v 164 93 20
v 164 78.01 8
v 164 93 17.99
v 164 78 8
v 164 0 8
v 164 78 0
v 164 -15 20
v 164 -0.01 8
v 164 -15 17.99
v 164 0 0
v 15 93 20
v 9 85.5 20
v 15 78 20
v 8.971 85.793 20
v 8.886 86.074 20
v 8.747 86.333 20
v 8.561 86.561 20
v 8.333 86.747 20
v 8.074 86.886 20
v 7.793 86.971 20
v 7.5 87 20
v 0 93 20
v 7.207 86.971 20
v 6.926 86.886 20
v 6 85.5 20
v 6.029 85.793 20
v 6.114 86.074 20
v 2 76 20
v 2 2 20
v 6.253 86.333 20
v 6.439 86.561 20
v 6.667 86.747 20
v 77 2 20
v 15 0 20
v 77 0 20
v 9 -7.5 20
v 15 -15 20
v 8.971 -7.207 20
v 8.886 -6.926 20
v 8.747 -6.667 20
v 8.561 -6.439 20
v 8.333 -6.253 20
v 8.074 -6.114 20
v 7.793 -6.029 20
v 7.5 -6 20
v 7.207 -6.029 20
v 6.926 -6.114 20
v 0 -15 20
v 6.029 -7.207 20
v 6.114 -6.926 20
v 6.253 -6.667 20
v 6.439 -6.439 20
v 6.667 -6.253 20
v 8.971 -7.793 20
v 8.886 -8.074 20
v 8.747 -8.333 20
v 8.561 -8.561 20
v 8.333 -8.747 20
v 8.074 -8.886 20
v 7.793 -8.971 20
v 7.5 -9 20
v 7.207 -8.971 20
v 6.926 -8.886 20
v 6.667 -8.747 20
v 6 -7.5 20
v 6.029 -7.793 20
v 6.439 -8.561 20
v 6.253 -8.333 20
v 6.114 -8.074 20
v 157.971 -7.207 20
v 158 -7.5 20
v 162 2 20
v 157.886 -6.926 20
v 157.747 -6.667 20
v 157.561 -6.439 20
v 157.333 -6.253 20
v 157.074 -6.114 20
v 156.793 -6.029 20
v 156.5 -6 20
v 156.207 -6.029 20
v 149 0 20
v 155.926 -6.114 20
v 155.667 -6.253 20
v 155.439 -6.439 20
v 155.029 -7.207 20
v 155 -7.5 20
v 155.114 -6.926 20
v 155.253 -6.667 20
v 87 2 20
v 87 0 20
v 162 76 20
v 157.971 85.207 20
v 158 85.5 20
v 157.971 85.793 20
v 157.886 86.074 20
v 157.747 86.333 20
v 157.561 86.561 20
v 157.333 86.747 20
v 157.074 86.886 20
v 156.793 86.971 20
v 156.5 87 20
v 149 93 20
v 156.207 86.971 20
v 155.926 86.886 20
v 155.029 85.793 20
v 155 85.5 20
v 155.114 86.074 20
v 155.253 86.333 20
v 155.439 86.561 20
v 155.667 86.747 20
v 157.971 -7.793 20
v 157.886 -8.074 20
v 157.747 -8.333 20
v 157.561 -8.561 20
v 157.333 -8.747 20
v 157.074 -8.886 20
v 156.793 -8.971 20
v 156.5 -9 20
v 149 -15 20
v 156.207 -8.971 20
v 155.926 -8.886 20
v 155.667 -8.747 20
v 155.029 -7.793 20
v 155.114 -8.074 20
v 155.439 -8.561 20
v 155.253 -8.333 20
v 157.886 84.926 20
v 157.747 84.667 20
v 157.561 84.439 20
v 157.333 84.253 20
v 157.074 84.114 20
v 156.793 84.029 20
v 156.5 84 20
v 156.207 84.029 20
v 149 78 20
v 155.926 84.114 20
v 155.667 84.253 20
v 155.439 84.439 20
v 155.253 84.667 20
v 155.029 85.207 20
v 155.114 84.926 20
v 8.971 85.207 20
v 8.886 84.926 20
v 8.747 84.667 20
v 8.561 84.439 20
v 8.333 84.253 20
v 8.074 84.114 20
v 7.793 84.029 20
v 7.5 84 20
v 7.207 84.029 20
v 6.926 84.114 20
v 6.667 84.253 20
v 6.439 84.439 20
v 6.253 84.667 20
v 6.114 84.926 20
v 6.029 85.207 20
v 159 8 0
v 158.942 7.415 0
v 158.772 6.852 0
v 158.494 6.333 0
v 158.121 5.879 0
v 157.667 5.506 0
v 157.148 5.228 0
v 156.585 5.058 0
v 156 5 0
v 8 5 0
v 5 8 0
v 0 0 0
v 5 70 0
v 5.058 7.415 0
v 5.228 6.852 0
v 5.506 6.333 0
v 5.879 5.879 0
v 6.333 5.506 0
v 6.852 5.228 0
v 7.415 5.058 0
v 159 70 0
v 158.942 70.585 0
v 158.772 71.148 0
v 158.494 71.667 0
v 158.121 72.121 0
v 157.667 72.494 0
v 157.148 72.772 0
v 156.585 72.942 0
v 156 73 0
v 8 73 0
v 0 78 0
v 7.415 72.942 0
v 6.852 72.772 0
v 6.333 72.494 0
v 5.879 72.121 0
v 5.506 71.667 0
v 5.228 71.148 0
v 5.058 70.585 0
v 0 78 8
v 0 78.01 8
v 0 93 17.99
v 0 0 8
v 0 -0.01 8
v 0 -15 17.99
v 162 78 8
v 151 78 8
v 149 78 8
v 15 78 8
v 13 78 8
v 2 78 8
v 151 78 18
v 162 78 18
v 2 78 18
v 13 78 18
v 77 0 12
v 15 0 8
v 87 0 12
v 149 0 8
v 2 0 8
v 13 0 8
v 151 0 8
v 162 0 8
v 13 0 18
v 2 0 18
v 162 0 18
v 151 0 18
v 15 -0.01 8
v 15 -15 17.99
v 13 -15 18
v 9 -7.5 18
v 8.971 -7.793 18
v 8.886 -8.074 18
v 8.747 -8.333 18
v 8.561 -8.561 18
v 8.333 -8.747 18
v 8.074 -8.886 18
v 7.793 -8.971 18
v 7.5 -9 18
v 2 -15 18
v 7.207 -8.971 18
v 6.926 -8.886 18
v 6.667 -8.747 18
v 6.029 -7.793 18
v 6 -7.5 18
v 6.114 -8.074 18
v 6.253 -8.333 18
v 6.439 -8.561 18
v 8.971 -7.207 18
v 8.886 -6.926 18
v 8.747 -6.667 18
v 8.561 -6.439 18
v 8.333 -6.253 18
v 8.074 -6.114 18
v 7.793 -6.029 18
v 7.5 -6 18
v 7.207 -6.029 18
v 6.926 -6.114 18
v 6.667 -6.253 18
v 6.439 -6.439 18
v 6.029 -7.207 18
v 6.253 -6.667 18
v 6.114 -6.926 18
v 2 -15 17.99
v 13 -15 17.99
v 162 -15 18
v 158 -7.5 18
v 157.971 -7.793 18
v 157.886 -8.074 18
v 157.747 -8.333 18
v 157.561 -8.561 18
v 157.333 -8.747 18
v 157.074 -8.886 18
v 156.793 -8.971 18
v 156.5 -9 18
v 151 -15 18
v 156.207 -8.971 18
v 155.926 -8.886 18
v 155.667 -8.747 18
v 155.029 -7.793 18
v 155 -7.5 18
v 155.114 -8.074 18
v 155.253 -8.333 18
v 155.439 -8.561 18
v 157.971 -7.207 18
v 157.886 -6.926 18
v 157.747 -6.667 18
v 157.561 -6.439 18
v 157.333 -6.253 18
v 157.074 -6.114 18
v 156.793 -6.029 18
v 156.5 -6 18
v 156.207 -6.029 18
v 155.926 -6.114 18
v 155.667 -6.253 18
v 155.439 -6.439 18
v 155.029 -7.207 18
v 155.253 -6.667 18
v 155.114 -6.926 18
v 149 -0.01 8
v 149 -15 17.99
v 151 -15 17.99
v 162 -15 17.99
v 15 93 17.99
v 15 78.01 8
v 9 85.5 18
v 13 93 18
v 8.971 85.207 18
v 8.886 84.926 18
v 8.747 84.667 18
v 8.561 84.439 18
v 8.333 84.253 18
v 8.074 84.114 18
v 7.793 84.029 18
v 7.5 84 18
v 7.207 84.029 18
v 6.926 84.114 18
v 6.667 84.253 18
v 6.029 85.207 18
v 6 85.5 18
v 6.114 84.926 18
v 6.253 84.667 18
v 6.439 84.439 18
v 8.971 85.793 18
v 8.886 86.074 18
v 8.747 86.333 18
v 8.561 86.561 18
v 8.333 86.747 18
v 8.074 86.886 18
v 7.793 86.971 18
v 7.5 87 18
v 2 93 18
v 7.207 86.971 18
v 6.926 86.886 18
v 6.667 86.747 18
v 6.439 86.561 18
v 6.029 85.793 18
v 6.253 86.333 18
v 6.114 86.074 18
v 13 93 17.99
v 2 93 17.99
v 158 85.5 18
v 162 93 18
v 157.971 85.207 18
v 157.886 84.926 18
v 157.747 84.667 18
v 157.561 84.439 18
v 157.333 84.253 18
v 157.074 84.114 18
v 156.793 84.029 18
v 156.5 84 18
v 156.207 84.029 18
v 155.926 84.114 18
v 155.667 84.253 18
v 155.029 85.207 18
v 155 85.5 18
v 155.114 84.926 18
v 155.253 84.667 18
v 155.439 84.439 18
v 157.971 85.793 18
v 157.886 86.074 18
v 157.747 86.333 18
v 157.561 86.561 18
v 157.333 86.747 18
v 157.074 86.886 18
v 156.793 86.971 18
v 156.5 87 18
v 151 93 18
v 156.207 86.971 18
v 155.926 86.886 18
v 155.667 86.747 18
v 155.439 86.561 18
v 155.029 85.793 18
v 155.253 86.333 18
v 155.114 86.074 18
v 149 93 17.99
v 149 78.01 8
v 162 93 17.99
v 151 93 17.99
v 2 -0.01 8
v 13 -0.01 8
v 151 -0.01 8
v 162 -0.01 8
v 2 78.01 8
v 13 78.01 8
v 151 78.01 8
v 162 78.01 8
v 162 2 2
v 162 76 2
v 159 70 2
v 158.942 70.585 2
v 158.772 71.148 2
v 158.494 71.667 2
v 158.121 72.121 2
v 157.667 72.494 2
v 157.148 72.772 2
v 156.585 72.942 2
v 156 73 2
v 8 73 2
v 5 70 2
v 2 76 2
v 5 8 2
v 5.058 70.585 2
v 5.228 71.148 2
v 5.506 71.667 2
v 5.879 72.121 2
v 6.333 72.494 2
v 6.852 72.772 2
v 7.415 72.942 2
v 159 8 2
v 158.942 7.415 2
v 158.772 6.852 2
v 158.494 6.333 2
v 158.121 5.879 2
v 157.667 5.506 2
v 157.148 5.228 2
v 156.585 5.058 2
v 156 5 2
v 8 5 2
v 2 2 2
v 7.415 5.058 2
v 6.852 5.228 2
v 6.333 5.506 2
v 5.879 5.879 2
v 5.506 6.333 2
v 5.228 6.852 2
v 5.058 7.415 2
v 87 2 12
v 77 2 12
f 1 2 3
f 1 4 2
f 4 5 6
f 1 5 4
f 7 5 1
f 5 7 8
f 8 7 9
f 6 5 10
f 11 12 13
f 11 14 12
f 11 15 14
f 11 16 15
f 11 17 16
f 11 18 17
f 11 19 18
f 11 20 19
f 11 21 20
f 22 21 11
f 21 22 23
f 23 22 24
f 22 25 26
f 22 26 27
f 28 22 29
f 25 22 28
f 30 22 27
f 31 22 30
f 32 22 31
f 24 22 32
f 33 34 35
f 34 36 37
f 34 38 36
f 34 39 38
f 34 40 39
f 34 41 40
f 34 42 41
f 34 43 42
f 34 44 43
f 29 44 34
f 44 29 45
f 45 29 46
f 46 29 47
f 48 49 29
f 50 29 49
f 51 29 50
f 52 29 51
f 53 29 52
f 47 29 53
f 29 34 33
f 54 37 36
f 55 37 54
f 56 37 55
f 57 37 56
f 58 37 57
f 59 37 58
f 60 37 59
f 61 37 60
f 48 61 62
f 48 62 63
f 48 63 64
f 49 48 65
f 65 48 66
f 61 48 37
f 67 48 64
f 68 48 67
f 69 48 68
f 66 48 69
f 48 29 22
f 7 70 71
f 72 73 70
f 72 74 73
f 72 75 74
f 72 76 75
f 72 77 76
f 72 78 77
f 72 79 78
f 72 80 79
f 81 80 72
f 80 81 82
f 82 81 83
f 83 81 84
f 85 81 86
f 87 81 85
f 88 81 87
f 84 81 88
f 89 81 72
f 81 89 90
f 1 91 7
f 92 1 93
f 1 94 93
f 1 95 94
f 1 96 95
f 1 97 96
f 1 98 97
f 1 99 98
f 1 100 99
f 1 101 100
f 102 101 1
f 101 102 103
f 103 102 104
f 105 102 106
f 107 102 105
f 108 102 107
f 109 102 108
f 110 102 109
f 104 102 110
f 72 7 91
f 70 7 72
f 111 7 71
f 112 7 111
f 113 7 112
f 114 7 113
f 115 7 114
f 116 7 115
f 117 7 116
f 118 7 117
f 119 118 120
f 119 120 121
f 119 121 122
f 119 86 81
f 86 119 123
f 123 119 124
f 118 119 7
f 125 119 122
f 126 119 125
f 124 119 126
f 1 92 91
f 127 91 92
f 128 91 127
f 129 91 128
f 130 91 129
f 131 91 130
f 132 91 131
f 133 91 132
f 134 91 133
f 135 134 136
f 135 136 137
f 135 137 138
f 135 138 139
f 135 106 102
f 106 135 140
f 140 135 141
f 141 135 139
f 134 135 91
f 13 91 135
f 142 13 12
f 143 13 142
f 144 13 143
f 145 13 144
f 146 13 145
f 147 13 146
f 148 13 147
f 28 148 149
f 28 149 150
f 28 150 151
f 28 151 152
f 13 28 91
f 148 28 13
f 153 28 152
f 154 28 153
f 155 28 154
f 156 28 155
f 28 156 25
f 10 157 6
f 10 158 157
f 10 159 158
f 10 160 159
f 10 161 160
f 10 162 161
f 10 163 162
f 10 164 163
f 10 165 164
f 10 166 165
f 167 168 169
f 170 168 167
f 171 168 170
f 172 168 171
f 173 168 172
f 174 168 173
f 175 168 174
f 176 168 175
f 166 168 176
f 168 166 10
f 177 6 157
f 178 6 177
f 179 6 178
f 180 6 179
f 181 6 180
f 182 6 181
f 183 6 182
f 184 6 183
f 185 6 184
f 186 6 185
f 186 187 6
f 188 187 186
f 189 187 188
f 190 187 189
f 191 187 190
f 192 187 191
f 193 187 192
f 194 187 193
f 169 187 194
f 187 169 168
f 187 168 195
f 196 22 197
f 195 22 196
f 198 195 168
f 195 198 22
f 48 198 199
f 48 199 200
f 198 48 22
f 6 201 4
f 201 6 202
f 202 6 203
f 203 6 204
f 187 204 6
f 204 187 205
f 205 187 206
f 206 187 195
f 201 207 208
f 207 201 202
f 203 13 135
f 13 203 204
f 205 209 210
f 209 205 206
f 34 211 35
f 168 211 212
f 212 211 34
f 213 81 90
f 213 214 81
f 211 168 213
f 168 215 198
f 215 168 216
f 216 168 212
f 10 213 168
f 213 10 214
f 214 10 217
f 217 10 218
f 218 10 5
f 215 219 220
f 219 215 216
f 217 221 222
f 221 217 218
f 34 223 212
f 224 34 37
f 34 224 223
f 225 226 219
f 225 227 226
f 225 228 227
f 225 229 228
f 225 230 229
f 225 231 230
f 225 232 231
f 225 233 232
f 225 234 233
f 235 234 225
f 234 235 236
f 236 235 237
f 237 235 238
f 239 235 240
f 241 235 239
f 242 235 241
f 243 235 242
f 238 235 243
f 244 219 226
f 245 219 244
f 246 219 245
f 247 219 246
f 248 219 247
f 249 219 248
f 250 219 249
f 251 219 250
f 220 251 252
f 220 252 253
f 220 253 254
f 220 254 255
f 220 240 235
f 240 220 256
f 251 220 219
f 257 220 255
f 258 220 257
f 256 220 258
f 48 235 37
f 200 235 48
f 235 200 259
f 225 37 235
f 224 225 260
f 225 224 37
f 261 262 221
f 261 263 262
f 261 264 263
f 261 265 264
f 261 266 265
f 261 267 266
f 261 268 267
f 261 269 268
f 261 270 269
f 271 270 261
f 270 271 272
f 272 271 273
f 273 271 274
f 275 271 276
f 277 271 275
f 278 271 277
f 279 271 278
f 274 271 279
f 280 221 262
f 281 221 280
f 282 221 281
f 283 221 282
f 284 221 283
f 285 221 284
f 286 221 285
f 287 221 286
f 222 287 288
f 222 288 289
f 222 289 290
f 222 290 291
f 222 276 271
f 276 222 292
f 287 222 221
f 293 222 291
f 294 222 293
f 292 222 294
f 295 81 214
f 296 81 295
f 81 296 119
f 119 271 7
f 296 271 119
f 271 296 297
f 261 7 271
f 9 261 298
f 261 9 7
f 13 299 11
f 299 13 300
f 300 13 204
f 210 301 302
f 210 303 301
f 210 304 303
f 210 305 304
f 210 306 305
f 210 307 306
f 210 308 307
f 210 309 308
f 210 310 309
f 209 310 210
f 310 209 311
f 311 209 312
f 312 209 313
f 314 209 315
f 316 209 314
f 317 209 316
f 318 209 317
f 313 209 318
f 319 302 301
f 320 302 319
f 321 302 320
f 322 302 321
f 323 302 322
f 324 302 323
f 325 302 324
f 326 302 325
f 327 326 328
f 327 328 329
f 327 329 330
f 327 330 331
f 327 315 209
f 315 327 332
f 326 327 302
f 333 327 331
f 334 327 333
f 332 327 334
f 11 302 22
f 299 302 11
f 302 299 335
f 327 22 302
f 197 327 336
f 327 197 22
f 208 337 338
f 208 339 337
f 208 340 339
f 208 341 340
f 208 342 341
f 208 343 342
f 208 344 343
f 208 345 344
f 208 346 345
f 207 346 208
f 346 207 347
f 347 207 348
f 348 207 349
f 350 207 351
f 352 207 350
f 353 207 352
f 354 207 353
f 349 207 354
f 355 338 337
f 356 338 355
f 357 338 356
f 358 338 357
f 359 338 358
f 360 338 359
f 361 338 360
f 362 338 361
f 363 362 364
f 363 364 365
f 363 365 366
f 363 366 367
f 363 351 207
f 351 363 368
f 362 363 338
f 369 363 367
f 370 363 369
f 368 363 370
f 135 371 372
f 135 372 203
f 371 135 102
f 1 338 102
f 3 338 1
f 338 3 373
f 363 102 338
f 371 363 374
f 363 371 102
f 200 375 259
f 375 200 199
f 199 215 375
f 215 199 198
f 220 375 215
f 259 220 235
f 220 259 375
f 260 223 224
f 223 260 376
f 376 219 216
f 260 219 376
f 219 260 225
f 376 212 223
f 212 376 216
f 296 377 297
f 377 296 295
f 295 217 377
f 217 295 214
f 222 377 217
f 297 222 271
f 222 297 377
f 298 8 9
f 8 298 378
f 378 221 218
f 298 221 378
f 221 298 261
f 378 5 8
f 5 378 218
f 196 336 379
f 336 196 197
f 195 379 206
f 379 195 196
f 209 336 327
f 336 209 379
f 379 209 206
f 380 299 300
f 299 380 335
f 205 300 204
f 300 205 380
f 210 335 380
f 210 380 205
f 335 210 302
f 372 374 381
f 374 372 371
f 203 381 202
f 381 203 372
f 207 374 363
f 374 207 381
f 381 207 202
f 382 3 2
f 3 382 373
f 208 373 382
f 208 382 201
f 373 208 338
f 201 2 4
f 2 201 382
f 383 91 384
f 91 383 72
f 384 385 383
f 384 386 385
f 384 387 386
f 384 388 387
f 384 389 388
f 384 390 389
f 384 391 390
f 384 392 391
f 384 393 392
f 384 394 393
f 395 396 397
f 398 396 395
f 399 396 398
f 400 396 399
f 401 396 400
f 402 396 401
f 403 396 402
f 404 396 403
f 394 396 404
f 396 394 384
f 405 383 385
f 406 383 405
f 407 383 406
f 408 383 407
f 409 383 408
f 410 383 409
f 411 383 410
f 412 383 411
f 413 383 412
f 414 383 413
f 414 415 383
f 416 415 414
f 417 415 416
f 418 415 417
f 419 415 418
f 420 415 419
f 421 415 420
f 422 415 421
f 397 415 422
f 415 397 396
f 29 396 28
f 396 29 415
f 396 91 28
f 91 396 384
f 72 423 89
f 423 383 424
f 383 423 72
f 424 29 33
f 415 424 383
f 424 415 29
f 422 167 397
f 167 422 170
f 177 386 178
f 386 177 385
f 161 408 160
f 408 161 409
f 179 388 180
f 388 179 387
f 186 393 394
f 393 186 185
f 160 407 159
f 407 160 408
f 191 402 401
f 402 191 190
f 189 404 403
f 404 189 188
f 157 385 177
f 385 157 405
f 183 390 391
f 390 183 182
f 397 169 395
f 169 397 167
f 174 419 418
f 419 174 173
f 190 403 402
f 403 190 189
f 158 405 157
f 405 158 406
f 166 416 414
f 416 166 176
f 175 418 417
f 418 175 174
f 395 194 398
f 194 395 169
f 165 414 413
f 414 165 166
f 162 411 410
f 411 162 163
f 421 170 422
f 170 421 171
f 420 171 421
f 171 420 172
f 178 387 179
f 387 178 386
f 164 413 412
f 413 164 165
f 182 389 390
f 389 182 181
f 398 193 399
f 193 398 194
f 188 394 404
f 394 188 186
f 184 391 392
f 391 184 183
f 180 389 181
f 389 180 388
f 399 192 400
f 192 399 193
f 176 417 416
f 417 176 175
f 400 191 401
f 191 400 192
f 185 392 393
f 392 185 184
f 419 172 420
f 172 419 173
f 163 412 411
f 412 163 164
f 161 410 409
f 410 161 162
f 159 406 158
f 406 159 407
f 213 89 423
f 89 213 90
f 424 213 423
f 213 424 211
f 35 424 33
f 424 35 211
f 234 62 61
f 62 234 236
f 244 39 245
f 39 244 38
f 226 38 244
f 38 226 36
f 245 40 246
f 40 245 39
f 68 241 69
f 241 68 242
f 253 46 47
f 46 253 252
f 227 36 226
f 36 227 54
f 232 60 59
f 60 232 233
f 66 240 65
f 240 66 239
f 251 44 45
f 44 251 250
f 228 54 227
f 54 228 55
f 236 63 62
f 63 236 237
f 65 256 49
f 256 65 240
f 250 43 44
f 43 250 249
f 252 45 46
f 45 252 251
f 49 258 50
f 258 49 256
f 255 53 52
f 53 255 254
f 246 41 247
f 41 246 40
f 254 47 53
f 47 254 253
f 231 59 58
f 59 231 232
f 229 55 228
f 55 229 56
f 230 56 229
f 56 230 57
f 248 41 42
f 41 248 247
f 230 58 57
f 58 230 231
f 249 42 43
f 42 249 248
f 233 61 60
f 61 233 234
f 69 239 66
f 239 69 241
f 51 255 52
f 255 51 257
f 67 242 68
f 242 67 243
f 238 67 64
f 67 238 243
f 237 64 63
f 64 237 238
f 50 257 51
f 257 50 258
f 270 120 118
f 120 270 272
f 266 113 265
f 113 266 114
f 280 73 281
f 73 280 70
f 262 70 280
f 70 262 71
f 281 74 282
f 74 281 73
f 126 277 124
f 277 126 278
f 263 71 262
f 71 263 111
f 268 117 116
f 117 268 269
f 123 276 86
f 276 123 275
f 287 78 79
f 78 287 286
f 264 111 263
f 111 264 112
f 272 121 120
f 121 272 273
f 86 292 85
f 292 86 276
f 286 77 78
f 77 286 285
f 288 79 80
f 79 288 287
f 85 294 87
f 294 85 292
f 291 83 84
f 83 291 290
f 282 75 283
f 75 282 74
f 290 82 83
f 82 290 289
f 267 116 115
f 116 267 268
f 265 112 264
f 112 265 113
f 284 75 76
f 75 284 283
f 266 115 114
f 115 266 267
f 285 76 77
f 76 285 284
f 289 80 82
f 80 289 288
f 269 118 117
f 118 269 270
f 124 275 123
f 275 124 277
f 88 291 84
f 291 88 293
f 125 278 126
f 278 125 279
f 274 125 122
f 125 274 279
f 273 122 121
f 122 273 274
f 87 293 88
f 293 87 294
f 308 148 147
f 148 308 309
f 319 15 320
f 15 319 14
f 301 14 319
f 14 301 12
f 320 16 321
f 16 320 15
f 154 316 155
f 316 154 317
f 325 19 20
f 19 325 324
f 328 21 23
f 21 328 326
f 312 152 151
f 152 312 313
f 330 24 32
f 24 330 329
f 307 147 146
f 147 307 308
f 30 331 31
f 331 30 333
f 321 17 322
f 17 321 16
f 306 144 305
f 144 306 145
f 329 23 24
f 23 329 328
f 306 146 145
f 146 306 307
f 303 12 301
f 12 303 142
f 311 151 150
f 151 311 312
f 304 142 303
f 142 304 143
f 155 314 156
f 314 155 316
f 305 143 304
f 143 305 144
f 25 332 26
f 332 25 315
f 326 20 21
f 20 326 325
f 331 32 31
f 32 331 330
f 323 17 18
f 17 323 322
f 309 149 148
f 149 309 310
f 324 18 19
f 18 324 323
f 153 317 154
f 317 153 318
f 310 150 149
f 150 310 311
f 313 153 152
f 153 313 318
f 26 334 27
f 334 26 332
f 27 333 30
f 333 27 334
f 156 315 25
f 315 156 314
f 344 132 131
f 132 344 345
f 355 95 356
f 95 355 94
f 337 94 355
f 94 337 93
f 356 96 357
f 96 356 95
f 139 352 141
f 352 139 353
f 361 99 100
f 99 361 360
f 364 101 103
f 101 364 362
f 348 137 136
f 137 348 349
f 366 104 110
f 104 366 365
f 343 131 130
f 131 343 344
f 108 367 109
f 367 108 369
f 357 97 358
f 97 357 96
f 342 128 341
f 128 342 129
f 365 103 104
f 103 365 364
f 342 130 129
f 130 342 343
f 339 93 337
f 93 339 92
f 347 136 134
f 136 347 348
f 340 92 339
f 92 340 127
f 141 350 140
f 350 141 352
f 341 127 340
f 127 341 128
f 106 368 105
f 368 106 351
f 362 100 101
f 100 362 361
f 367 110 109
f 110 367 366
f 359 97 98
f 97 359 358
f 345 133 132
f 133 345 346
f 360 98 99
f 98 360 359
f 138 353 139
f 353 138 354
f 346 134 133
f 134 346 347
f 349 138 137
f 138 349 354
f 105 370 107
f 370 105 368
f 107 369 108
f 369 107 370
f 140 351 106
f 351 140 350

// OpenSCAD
// Box enclosure for 160x74x18mm object

// Inner dimensions (the object to enclose)
inner_length = 160;
inner_width = 74;
inner_height = 18;

// Wall thickness
wall = 2;

// Bottom hole inset from inner walls
hole_inset = 3;

// Bottom hole corner radius
hole_corner_radius = 3;

// Side hole dimensions
side_hole_width = 10;
side_hole_height = 8;

// Overhang dimensions
overhang_width = 15;
overhang_length = 15;

// Screw hole diameter
screw_hole_d = 3;

// Gusset dimensions
gusset_thickness = 2;
gusset_height = 10;

// Outer dimensions
outer_length = inner_length + 2 * wall;
outer_width = inner_width + 2 * wall;
outer_height = inner_height + wall; // wall on bottom only, open top

// Bottom hole dimensions
hole_length = inner_length - 2 * hole_inset;
hole_width = inner_width - 2 * hole_inset;

// Overhang positions along X (flush to edges)
overhang_x1 = 0;
overhang_x2 = outer_length - overhang_width;

// Rounded rectangle module
module rounded_rect(length, width, height, radius) {
    translate([radius, radius, 0])
        hull() {
            cylinder(h = height, r = radius, $fn = 32);
            translate([length - 2 * radius, 0, 0])
                cylinder(h = height, r = radius, $fn = 32);
            translate([0, width - 2 * radius, 0])
                cylinder(h = height, r = radius, $fn = 32);
            translate([length - 2 * radius, width - 2 * radius, 0])
                cylinder(h = height, r = radius, $fn = 32);
        }
}

// Gusset module: right-triangle brace
module gusset(length, height, thickness) {
    hull() {
        cube([thickness, 0.01, height]);
        translate([0, length - 0.01, height - 0.01])
            cube([thickness, 0.01, 0.01]);
    }
}

difference() {
    union() {
        // Outer shell
        cube([outer_length, outer_width, outer_height]);

        // Left side overhangs (Y=0, extending in -Y)
        translate([overhang_x1, -overhang_length, outer_height - wall])
            cube([overhang_width, overhang_length, wall]);
        translate([overhang_x2, -overhang_length, outer_height - wall])
            cube([overhang_width, overhang_length, wall]);

        // Right side overhangs (Y=outer_width, extending in +Y)
        translate([overhang_x1, outer_width, outer_height - wall])
            cube([overhang_width, overhang_length, wall]);
        translate([overhang_x2, outer_width, outer_height - wall])
            cube([overhang_width, overhang_length, wall]);

        // Gussets - left side, front overhang
        translate([overhang_x1, 0, outer_height - wall - gusset_height])
            mirror([0, 1, 0])
                gusset(overhang_length, gusset_height, gusset_thickness);
        translate([overhang_x1 + overhang_width - gusset_thickness, 0, outer_height - wall - gusset_height])
            mirror([0, 1, 0])
                gusset(overhang_length, gusset_height, gusset_thickness);

        // Gussets - left side, rear overhang
        translate([overhang_x2, 0, outer_height - wall - gusset_height])
            mirror([0, 1, 0])
                gusset(overhang_length, gusset_height, gusset_thickness);
        translate([overhang_x2 + overhang_width - gusset_thickness, 0, outer_height - wall - gusset_height])
            mirror([0, 1, 0])
                gusset(overhang_length, gusset_height, gusset_thickness);

        // Gussets - right side, front overhang
        translate([overhang_x1, outer_width, outer_height - wall - gusset_height])
            gusset(overhang_length, gusset_height, gusset_thickness);
        translate([overhang_x1 + overhang_width - gusset_thickness, outer_width, outer_height - wall - gusset_height])
            gusset(overhang_length, gusset_height, gusset_thickness);

        // Gussets - right side, rear overhang
        translate([overhang_x2, outer_width, outer_height - wall - gusset_height])
            gusset(overhang_length, gusset_height, gusset_thickness);
        translate([overhang_x2 + overhang_width - gusset_thickness, outer_width, outer_height - wall - gusset_height])
            gusset(overhang_length, gusset_height, gusset_thickness);
    }

    // Inner cavity
    translate([wall, wall, wall])
        cube([inner_length, inner_width, inner_height + 1]);

    // Rounded square hole in the bottom
    translate([wall + hole_inset, wall + hole_inset, -1])
        rounded_rect(hole_length, hole_width, wall + 2, hole_corner_radius);

    // Hole on the long side (front), centered horizontally, near top edge
    translate([outer_length / 2 - side_hole_width / 2, -1, outer_height - side_hole_height])
        cube([side_hole_width, wall + 2, side_hole_height + 1]);

    // Screw holes in overhangs - left side
    translate([overhang_x1 + overhang_width / 2, -overhang_length / 2, outer_height - wall - 1])
        cylinder(h = wall + 2, d = screw_hole_d, $fn = 32);
    translate([overhang_x2 + overhang_width / 2, -overhang_length / 2, outer_height - wall - 1])
        cylinder(h = wall + 2, d = screw_hole_d, $fn = 32);

    // Screw holes in overhangs - right side
    translate([overhang_x1 + overhang_width / 2, outer_width + overhang_length / 2, outer_height - wall - 1])
        cylinder(h = wall + 2, d = screw_hole_d, $fn = 32);
    translate([overhang_x2 + overhang_width / 2, outer_width + overhang_length / 2, outer_height - wall - 1])
        cylinder(h = wall + 2, d = screw_hole_d, $fn = 32);
}
